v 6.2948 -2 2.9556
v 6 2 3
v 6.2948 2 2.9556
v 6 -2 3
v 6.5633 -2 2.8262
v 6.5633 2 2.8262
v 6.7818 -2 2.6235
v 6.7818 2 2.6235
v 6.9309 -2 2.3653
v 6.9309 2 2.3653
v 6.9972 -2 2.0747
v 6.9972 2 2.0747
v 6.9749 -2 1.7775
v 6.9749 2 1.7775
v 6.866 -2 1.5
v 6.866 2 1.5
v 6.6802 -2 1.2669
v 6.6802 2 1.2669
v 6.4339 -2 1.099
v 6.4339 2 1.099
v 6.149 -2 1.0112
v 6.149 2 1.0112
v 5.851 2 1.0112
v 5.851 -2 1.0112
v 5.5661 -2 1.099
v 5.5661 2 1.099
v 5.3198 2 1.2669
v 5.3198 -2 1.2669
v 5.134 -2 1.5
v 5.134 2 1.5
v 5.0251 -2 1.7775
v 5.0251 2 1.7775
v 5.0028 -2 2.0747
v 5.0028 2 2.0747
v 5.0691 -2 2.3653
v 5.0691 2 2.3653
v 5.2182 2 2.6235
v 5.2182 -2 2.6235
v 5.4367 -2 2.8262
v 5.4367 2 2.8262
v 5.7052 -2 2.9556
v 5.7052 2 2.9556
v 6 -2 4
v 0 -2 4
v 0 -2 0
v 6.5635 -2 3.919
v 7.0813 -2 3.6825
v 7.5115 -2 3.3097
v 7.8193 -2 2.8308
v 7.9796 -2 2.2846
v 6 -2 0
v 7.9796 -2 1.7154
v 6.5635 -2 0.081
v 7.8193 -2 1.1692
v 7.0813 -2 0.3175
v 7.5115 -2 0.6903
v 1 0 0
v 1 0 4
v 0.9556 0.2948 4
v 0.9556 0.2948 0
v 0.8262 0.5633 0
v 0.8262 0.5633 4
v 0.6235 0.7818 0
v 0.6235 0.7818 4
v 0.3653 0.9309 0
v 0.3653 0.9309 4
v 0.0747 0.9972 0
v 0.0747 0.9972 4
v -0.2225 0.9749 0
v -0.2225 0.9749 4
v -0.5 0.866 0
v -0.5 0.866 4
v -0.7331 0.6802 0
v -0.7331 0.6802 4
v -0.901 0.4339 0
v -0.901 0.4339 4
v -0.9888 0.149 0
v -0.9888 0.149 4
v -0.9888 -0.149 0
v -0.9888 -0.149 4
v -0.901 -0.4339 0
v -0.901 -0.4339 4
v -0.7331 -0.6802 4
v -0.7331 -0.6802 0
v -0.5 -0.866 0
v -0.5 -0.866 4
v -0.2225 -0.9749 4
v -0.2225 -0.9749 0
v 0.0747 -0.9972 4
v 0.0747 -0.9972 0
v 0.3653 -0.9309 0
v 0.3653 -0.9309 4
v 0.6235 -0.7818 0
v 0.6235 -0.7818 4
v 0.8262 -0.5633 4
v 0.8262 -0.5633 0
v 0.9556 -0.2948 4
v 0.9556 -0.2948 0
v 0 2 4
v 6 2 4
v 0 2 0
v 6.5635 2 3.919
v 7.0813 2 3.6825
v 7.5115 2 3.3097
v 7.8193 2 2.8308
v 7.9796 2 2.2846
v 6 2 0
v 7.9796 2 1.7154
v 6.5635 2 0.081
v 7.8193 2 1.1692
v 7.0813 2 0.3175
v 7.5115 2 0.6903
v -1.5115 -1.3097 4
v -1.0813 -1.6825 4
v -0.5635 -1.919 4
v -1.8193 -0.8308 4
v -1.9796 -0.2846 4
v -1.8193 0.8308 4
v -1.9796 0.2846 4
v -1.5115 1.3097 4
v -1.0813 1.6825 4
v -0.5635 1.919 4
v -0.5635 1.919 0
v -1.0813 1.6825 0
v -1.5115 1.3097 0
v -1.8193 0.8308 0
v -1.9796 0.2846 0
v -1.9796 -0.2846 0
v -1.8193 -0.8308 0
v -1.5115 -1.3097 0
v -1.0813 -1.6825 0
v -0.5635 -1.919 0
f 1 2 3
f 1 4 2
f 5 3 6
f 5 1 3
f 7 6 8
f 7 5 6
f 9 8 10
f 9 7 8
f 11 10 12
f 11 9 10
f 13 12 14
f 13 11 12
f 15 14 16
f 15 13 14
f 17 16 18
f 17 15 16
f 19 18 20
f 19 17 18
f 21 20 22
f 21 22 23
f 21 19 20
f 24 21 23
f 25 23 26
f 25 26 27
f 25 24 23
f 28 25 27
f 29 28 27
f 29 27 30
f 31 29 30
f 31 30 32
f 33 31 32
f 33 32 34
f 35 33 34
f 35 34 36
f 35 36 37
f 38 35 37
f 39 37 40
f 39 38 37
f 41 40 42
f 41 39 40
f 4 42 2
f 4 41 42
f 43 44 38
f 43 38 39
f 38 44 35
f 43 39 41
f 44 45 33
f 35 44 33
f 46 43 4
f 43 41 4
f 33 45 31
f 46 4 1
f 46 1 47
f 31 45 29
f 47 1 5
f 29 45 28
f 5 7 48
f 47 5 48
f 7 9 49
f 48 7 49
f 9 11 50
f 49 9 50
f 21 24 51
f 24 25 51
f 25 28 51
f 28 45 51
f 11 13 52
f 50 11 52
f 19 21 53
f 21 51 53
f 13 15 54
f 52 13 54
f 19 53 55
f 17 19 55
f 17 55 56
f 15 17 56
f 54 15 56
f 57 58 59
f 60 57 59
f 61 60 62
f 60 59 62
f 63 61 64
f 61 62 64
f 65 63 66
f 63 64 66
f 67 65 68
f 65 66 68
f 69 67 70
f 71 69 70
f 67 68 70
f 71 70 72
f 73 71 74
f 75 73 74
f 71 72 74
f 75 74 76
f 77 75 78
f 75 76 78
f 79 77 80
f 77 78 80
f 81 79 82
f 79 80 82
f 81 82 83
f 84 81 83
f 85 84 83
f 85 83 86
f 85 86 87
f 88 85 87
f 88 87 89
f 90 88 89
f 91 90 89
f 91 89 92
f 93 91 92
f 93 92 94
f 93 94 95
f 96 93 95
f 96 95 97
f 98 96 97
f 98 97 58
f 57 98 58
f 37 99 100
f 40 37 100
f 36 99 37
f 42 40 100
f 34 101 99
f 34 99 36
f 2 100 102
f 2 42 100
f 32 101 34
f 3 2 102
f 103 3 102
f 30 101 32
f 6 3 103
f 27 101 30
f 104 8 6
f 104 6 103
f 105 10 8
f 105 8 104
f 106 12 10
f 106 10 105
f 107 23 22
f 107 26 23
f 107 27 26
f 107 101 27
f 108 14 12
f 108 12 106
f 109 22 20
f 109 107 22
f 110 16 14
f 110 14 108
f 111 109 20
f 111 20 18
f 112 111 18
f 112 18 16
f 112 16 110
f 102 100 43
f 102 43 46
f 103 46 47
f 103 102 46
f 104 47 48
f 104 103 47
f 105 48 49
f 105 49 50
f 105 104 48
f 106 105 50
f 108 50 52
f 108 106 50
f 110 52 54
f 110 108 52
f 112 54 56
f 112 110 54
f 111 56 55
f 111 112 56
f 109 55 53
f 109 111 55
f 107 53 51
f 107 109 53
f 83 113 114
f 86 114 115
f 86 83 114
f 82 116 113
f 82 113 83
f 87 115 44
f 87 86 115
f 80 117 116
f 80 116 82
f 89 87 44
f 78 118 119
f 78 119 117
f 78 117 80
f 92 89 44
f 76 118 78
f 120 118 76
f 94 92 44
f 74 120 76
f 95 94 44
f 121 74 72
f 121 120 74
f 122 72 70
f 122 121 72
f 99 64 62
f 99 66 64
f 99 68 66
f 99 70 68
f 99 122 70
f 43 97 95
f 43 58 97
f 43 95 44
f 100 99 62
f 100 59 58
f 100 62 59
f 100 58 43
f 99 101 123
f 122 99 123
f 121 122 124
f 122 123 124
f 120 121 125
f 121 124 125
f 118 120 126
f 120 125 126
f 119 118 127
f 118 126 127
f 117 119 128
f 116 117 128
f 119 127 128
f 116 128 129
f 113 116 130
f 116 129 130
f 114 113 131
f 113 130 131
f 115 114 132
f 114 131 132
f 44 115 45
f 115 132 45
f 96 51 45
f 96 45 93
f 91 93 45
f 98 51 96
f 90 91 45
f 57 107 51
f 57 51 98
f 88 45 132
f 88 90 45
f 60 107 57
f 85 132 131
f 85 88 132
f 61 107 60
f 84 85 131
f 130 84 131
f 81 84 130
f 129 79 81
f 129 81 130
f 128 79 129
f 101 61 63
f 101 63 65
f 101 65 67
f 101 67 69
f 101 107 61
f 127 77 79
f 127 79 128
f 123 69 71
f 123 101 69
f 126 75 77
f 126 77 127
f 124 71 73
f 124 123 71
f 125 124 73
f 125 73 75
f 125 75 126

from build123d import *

# Parameters (mm, degrees)
SKETCH1_R           = 2
BOSS_EXTRUDE1_DEPTH = 4
BOSS_EXTRUDE2_START = -4
BOSS_EXTRUDE2_DEPTH = 4
SKETCH3_R           = 1
CUT_EXTRUDE1_DEPTH  = 6.385164807
SKETCH7_R           = 1
BOSS_EXTRUDE4_DEPTH = 2


with BuildPart() as part:
    # Sketch1 → Boss-Extrude1 (new body)
    with BuildSketch(Plane.XY):
        Circle(SKETCH1_R)
    extrude(amount=BOSS_EXTRUDE1_DEPTH)

    # Sketch2 → Boss-Extrude2 (add)
    with BuildSketch(Plane.XY.offset(4).offset(BOSS_EXTRUDE2_START)):
        with BuildLine():
            Line((3, 2), (0, 2))
            ThreePointArc((0, 2), (1.414213562, 1.414213562), (2, 0))
            ThreePointArc((2, 0), (1.414213562, -1.414213562), (0, -2))
            Line((0, -2), (3, -2))
            Line((3, -2), (3, 2))
        make_face()
    extrude(amount=BOSS_EXTRUDE2_DEPTH)

    # Sketch3 → Cut-Extrude1 (cut, through all)
    with BuildSketch(Plane.XY.offset(4)):
        Circle(SKETCH3_R)
    extrude(amount=-CUT_EXTRUDE1_DEPTH, mode=Mode.SUBTRACT)

    # Sketch7 → Boss-Extrude4 (add, symmetric)
    with BuildSketch(Plane(origin=(0, 0, 0), x_dir=(1, 0, 0), z_dir=(0, 1, 0))):
        with BuildLine():
            Line((3, 0), (3, -4))
            Line((3, -4), (6, -4))
            ThreePointArc((6, -4), (8, -2), (6, 0))
            Line((6, 0), (3, 0))
        make_face()
        with Locations(Location((6, -2, 0), (0, 0, 270))):
            Circle(SKETCH7_R, mode=Mode.SUBTRACT)
    extrude(amount=BOSS_EXTRUDE4_DEPTH, both=True)


solid = part.part
